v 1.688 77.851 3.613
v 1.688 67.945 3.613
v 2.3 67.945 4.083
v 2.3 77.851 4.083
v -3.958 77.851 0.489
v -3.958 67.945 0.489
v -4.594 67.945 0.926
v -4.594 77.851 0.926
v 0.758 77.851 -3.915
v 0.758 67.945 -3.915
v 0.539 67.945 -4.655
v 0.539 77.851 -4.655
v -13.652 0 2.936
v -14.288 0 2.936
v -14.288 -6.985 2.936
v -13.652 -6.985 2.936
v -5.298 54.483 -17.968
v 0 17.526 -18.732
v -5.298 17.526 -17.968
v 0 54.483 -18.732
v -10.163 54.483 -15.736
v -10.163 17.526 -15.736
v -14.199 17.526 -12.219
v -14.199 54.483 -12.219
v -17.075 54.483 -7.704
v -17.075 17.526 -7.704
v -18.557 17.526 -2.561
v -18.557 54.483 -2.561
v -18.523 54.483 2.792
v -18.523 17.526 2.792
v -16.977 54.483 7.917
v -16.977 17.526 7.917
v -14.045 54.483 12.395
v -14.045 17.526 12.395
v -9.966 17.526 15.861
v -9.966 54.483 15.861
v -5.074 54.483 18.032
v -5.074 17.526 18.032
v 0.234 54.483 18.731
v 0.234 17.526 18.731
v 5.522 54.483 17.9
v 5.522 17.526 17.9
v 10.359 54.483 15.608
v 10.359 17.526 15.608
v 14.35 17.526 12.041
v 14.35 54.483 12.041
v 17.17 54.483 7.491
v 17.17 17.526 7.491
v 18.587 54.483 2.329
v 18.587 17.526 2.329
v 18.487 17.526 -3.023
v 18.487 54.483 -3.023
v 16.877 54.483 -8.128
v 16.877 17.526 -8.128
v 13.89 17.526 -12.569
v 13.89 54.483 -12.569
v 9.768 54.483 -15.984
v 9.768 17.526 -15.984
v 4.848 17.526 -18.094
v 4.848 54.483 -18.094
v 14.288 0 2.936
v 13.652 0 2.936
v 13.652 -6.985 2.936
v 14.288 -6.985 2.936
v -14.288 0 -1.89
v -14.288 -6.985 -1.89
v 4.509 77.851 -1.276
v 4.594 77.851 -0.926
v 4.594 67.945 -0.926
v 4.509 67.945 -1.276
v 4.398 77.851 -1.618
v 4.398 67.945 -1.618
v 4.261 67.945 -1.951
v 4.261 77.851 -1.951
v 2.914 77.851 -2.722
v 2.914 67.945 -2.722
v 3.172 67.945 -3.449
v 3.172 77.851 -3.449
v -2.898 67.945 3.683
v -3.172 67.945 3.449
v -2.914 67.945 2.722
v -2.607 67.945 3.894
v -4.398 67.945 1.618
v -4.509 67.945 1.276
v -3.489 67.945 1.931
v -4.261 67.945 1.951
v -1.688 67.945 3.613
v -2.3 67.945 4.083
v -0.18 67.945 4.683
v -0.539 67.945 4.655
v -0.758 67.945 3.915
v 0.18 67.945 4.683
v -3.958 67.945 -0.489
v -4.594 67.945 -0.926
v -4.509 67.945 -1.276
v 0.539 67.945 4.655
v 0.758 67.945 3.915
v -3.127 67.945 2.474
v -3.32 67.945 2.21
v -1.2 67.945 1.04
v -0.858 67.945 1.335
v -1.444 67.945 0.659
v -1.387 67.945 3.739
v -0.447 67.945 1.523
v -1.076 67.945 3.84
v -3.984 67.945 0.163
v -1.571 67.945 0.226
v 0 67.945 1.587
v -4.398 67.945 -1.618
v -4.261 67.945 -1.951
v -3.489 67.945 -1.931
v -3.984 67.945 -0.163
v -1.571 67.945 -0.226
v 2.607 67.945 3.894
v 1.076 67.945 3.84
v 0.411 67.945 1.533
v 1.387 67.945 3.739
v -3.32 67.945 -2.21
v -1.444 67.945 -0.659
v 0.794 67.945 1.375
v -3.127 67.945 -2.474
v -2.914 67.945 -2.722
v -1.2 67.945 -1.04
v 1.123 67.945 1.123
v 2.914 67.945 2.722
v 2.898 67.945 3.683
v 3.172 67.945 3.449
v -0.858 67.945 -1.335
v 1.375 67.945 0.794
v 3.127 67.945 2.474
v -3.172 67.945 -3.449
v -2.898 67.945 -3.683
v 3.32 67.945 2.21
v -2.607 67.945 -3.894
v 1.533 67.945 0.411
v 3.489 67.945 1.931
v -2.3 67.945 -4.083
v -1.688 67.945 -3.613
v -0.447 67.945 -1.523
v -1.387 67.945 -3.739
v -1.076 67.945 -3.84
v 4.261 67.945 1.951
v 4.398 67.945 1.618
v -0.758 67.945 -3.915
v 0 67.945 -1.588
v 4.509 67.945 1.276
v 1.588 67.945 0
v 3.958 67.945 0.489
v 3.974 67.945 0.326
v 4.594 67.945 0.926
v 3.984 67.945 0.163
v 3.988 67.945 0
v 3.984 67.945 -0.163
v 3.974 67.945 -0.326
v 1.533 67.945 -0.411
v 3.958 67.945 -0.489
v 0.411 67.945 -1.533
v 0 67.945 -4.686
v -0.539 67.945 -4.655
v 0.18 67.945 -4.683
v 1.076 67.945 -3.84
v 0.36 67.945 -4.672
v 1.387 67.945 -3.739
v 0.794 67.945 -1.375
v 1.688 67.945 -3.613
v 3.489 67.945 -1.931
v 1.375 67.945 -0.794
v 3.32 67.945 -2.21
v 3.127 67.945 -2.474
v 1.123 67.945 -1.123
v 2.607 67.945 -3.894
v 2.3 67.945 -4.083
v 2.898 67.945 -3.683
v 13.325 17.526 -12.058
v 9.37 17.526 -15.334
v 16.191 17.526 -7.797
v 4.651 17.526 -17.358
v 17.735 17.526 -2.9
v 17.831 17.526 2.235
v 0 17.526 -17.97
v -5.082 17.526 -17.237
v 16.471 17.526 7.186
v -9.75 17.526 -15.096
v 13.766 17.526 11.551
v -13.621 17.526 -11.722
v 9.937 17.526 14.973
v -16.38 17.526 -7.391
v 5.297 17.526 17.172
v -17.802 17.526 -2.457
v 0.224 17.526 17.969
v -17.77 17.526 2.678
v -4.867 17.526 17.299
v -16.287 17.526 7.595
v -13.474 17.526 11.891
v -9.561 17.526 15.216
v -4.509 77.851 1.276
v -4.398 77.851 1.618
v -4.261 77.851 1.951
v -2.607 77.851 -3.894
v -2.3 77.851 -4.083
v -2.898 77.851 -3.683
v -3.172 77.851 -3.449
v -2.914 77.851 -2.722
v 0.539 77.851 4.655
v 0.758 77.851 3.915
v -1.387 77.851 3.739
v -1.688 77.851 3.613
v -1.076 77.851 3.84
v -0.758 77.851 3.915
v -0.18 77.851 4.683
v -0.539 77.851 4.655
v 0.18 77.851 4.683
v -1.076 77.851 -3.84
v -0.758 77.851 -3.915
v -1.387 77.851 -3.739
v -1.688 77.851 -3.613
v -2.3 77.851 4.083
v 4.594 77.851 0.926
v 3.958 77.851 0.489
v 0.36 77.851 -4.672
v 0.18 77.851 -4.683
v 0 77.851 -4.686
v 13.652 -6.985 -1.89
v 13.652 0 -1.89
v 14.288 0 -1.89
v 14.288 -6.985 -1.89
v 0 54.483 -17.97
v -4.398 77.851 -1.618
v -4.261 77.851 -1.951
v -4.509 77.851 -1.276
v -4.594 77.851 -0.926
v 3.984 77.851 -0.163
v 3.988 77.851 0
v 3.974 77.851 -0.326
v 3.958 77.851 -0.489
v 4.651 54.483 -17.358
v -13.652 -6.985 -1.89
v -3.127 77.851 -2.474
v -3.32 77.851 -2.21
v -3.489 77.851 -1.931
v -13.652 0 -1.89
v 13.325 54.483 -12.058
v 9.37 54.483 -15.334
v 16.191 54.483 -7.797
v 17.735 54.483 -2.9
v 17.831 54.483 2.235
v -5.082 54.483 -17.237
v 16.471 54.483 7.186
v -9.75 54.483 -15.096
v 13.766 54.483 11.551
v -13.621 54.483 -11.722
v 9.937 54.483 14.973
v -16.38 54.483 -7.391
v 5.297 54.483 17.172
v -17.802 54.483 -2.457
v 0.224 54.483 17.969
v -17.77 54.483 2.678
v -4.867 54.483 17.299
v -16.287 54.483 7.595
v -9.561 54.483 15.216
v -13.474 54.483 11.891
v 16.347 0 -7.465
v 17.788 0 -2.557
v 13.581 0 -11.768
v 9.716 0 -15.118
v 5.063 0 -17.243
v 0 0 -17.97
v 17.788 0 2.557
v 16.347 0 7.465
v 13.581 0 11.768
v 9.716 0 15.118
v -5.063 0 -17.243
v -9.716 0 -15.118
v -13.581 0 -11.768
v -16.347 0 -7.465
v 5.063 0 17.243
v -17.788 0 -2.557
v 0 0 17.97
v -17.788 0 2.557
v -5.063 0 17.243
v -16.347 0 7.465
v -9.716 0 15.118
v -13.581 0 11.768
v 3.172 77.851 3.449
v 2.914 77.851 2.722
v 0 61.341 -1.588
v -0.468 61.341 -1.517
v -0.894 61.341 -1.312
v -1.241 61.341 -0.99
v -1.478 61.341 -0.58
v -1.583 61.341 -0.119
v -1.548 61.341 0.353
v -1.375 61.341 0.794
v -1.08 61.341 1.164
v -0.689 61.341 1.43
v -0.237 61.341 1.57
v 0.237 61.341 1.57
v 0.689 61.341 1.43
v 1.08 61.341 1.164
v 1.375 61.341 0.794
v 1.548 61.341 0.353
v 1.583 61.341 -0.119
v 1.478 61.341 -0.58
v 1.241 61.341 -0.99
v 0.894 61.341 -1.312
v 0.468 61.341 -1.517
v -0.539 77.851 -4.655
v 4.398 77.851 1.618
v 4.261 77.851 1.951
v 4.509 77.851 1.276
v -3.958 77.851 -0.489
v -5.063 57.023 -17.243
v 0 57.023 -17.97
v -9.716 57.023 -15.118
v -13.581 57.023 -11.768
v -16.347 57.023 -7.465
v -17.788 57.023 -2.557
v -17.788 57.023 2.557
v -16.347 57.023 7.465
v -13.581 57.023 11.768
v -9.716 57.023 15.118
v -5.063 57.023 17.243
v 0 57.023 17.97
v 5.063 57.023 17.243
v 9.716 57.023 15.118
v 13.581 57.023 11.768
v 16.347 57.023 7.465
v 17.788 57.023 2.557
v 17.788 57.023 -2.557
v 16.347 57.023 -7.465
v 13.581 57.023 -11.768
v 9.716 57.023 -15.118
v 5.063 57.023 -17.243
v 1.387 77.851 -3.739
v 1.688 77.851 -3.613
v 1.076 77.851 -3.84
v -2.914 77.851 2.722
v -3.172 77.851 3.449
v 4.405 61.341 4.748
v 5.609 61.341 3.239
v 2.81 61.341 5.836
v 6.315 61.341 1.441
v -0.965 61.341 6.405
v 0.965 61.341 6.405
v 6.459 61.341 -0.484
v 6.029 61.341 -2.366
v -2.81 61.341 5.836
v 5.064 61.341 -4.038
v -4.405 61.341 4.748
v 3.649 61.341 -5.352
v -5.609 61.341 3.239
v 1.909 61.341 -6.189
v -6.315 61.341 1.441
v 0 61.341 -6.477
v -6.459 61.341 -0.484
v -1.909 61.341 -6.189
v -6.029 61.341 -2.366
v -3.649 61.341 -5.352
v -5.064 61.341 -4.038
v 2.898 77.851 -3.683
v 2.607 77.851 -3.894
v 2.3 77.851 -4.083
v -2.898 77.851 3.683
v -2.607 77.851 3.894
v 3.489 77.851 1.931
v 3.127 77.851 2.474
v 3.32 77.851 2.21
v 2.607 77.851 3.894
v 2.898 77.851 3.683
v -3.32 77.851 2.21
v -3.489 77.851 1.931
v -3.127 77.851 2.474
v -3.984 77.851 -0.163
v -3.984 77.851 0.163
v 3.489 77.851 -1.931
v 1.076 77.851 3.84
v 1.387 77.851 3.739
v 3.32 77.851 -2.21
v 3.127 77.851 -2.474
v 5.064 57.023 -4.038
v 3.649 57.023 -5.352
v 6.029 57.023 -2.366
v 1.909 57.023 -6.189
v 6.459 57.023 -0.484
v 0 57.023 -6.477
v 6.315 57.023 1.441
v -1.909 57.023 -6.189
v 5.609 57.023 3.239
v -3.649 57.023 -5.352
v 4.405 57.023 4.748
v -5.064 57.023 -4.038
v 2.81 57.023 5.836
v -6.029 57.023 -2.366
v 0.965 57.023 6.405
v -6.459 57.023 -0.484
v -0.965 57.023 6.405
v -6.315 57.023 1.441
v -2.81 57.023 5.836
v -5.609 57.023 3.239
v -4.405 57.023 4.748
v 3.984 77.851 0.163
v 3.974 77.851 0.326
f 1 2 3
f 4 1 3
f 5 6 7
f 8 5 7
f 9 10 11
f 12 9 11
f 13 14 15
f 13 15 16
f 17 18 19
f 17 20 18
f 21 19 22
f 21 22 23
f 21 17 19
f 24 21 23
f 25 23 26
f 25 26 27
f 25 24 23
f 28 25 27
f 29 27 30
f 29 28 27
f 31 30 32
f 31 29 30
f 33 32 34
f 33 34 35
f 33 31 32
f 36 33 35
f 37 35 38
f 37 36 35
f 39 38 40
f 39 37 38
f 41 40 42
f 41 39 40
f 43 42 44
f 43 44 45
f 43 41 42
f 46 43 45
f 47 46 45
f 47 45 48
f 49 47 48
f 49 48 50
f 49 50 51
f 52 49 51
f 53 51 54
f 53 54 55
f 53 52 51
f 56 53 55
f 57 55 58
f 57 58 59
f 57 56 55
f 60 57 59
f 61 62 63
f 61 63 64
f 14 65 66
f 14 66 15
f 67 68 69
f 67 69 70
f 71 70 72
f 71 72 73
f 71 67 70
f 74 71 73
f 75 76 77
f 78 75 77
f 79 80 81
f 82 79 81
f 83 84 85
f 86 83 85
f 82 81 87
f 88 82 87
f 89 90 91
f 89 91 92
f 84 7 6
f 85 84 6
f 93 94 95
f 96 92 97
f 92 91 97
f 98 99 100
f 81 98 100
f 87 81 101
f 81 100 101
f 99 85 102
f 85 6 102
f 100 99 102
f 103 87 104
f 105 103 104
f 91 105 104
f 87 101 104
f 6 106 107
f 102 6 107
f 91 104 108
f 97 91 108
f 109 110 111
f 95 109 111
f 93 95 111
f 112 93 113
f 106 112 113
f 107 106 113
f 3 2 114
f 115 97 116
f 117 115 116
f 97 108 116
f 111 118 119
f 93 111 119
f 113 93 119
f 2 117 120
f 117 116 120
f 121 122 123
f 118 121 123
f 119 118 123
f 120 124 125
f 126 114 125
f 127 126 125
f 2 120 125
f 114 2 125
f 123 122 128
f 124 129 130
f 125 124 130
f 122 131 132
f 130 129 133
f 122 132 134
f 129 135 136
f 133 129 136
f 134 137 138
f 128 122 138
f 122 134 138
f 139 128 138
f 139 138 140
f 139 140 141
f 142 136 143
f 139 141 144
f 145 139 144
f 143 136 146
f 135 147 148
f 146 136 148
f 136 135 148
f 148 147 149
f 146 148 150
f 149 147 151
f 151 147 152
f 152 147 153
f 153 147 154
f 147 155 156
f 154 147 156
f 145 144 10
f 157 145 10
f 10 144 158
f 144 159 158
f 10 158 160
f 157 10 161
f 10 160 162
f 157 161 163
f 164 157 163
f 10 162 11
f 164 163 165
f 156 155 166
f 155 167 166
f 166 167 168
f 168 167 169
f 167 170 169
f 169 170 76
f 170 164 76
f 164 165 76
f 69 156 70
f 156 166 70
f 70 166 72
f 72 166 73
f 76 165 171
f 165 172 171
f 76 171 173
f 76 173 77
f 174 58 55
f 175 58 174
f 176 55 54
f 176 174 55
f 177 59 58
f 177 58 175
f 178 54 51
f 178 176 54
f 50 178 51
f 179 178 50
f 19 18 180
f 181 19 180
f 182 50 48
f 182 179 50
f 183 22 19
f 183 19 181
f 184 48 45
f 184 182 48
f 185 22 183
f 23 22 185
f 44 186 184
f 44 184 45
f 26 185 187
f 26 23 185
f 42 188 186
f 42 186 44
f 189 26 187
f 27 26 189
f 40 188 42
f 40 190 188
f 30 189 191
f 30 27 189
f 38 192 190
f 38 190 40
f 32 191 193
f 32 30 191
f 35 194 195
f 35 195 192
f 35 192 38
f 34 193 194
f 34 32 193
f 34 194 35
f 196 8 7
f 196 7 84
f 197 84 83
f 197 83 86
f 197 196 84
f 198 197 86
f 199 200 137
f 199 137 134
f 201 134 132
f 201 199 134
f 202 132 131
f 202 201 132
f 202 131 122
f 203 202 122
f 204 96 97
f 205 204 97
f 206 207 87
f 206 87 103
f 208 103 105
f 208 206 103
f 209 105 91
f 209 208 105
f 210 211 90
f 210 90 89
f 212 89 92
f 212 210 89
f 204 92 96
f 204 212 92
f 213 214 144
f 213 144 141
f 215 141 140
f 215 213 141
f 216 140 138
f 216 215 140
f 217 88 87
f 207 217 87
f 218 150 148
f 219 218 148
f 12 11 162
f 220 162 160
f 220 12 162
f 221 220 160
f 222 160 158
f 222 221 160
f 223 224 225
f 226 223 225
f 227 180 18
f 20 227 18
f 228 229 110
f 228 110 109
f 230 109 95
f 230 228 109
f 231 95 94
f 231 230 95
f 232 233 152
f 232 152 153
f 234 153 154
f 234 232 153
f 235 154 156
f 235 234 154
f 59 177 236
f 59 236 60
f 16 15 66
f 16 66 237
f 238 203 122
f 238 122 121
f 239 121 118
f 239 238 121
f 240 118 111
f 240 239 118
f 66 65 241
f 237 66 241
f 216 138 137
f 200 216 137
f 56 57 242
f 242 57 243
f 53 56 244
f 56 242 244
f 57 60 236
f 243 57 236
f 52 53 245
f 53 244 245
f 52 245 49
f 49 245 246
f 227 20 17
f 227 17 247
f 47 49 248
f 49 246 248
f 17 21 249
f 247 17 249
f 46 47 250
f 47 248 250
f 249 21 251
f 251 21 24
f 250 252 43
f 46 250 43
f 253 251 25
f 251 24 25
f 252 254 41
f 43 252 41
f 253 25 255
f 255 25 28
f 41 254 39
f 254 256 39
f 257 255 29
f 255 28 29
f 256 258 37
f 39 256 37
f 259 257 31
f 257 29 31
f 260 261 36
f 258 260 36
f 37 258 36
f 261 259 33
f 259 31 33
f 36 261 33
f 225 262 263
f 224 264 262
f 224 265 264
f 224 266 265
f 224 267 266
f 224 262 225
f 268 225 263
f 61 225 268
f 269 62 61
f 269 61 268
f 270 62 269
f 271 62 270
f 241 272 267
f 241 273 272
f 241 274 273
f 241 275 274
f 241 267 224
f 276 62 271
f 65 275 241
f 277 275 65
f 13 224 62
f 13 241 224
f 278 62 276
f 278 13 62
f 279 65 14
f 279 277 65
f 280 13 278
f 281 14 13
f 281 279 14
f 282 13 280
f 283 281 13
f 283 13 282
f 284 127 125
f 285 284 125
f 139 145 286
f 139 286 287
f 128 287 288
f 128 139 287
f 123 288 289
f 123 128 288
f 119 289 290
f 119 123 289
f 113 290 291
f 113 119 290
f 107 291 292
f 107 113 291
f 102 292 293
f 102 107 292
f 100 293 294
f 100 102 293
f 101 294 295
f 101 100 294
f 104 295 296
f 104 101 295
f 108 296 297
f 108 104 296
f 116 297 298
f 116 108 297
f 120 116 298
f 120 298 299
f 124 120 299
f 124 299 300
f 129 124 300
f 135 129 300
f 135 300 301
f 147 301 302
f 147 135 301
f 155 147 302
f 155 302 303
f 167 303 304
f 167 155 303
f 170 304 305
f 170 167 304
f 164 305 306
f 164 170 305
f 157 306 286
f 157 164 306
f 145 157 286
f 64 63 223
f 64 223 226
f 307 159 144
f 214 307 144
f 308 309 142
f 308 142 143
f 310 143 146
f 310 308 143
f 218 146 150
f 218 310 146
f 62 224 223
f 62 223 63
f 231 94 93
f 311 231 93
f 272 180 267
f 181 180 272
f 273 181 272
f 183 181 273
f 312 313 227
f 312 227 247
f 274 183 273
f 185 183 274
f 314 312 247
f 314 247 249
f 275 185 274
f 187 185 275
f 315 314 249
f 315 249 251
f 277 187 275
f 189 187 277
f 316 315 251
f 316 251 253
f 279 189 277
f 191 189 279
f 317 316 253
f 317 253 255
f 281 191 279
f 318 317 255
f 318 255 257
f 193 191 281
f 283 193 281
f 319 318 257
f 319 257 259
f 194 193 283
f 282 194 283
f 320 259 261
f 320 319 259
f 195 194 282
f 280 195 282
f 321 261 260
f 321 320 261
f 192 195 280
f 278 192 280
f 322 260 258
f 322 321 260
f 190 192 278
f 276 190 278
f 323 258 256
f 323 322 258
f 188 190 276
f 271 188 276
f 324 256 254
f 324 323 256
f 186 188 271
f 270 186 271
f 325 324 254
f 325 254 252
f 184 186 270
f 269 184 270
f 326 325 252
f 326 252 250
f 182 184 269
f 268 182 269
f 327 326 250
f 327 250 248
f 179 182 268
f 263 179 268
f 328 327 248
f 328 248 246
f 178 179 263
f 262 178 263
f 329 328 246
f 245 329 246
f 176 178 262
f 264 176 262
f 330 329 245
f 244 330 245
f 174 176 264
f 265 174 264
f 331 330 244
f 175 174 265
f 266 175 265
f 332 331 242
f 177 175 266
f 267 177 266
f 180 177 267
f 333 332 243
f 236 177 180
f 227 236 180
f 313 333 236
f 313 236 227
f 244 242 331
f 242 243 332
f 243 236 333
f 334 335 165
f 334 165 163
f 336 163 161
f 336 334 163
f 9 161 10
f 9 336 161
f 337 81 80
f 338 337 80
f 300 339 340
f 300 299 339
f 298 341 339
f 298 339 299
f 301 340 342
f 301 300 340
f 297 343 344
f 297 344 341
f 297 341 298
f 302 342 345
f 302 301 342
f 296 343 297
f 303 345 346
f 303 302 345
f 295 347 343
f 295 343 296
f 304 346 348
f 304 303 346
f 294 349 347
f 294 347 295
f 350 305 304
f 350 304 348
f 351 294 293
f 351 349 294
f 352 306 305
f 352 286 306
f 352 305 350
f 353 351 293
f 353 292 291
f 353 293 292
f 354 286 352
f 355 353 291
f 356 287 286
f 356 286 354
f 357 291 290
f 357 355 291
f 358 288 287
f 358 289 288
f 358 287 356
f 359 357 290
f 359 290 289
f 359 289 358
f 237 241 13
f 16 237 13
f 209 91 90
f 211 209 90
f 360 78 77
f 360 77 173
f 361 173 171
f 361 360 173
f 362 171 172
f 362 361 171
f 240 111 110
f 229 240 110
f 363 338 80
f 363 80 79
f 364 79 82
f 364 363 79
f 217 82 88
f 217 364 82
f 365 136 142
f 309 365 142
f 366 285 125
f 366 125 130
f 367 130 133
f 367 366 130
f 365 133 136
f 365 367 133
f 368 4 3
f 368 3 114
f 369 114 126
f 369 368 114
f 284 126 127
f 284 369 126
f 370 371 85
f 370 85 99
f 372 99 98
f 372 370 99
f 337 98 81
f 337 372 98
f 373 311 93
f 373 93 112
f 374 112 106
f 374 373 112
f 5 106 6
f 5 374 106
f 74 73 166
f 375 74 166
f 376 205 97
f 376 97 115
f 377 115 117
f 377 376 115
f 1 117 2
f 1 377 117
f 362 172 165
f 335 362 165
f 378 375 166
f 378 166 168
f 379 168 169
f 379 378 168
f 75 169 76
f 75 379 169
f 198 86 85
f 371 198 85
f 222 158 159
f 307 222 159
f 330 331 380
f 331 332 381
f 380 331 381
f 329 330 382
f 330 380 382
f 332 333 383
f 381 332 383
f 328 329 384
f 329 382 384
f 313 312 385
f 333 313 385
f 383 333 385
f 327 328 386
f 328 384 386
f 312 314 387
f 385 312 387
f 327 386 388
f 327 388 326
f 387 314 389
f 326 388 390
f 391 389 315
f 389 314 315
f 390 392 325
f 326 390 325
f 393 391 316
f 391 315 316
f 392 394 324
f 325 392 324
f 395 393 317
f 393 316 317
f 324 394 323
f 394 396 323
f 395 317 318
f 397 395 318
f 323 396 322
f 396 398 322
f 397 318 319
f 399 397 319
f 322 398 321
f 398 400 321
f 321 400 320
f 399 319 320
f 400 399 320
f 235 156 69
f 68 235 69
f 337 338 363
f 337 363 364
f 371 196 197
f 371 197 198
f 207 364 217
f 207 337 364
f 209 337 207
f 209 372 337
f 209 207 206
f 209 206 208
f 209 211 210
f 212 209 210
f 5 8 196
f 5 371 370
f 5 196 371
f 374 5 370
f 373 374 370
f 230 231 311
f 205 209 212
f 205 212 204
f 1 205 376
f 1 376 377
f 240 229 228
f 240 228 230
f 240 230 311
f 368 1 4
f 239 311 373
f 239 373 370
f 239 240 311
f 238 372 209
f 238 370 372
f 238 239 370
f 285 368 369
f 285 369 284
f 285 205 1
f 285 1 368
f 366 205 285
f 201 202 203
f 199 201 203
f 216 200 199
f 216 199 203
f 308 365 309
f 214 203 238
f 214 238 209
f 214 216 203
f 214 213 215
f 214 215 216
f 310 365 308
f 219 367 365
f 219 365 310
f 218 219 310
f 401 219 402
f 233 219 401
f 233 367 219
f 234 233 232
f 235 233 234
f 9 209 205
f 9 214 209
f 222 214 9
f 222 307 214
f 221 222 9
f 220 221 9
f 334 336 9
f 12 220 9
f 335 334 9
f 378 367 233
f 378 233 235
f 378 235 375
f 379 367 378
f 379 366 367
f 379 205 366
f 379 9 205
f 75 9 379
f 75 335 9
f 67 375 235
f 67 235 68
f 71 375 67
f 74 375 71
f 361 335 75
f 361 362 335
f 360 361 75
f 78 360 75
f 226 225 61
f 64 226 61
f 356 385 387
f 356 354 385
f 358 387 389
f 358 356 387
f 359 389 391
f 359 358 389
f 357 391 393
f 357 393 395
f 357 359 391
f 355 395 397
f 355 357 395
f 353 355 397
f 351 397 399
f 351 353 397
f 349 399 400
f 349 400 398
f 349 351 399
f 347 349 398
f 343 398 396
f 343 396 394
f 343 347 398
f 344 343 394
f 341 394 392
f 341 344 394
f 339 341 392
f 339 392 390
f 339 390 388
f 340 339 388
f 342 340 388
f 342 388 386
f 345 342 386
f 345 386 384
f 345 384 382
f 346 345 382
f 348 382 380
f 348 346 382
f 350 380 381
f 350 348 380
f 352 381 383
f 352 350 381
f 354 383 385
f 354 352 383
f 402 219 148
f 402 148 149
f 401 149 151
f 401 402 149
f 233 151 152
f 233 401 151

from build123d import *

# Parameters (mm, degrees)
SKETCH4_W           = 17.9705
SKETCH4_H           = 57.023
SKETCH4_W_2         = 1.5875
SKETCH4_H_2         = 16.51
BOSS_EXTRUDE3_DEPTH = 9.906
SKETCH6_W           = 0.762
SKETCH6_H           = 36.957
REVOLVE2_ANGLE      = 345
SKETCH8_W           = 0.635
SKETCH8_H           = 4.826
BOSS_EXTRUDE4_DEPTH = 6.985


with BuildPart() as part:
    # Sketch4 → Revolve1 (revolve)
    with BuildSketch(Plane(origin=(0, 0, 0), x_dir=(0, 0, -1), z_dir=(1, 0, 0))):
        with Locations((8.98525, 28.5115)):
            Rectangle(SKETCH4_W, SKETCH4_H)
        Polygon((0, 61.341), (0, 57.023), (6.477, 57.023), (6.477, 61.341), (1.5875, 61.341), align=None)
        with Locations((0.79375, 69.596)):
            Rectangle(SKETCH4_W_2, SKETCH4_H_2)
    revolve(axis=Axis((0, -9.179219972, 0), (0, 1, 0)))

    # Sketch5 → Boss-Extrude3 (add)
    # profile 1 of 12: a face of its own
    with BuildSketch(Plane(origin=(0, 77.851, 0), x_dir=(1, 0, 0), z_dir=(0, 1, 0))):
        with BuildLine():
            ThreePointArc((-2.91443478, 2.721877799), (-2.343970029, 3.22619797), (-1.688049741, 3.612898686))
            Line((-1.688049741, 3.612898686), (-2.300310076, 4.082888836))
            ThreePointArc((-2.300310076, 4.082888836), (-2.754538028, 3.791296341), (-3.172223127, 3.449406923))
            Line((-3.172223127, 3.449406923), (-2.91443478, 2.721877799))
        make_face()
    # profile 2 of 12: a face of its own
    with BuildSketch(Plane(origin=(0, 77.851, 0), x_dir=(1, 0, 0), z_dir=(0, 1, 0))):
        with BuildLine():
            Line((0, 4.6863), (0, 3.9878))
            ThreePointArc((0, 3.9878), (0.380712775, 3.969585195), (0.757947638, 3.915107178))
            Line((0.757947638, 3.915107178), (0.538871901, 4.655214793))
            ThreePointArc((0.538871901, 4.655214793), (0.269883871, 4.678522244), (0, 4.6863))
        make_face()
    # profile 3 of 12: a face of its own
    with BuildSketch(Plane(origin=(0, 77.851, 0), x_dir=(1, 0, 0), z_dir=(0, 1, 0))):
        with BuildLine():
            Line((-0.538871901, 4.655214793), (-0.757947638, 3.915107178))
            ThreePointArc((-0.757947638, 3.915107178), (-0.380712775, 3.969585195), (0, 3.9878))
            Line((0, 3.9878), (0, 4.6863))
            Line((0, 4.6863), (-0.538871901, 4.655214793))
        make_face()
    # profile 4 of 12: a face of its own
    with BuildSketch(Plane(origin=(0, 77.851, 0), x_dir=(1, 0, 0), z_dir=(0, 1, 0))):
        with BuildLine():
            Line((2.300310076, 4.082888836), (1.688049741, 3.612898686))
            ThreePointArc((1.688049741, 3.612898686), (2.343970029, 3.22619797), (2.91443478, 2.721877799))
            Line((2.91443478, 2.721877799), (3.172223127, 3.449406923))
            ThreePointArc((3.172223127, 3.449406923), (2.754538028, 3.791296341), (2.300310076, 4.082888836))
        make_face()
    # profile 5 of 12: a face of its own
    with BuildSketch(Plane(origin=(0, 77.851, 0), x_dir=(1, 0, 0), z_dir=(0, 1, 0))):
        with BuildLine():
            Line((4.260851788, 1.951038116), (3.489269493, 1.930685693))
            ThreePointArc((3.489269493, 1.930685693), (3.792623176, 1.23229797), (3.957706895, 0.488983613))
            Line((3.957706895, 0.488983613), (4.593892938, 0.926042851))
            ThreePointArc((4.593892938, 0.926042851), (4.456936152, 1.448146341), (4.260851788, 1.951038116))
        make_face()
    # profile 6 of 12: a face of its own
    with BuildSketch(Plane(origin=(0, 77.851, 0), x_dir=(1, 0, 0), z_dir=(0, 1, 0))):
        with BuildLine():
            Line((4.593892938, -0.926042851), (3.957706895, -0.488983613))
            ThreePointArc((3.957706895, -0.488983613), (3.792623176, -1.23229797), (3.489269493, -1.930685693))
            Line((3.489269493, -1.930685693), (4.260851788, -1.951038116))
            ThreePointArc((4.260851788, -1.951038116), (4.456936152, -1.448146341), (4.593892938, -0.926042851))
        make_face()
    # profile 7 of 12: a face of its own
    with BuildSketch(Plane(origin=(0, 77.851, 0), x_dir=(1, 0, 0), z_dir=(0, 1, 0))):
        with BuildLine():
            Line((3.172223127, -3.449406923), (2.91443478, -2.721877799))
            ThreePointArc((2.91443478, -2.721877799), (2.343970029, -3.22619797), (1.688049741, -3.612898686))
            Line((1.688049741, -3.612898686), (2.300310076, -4.082888836))
            ThreePointArc((2.300310076, -4.082888836), (2.754538028, -3.791296341), (3.172223127, -3.449406923))
        make_face()
    # profile 8 of 12: a face of its own
    with BuildSketch(Plane(origin=(0, 77.851, 0), x_dir=(1, 0, 0), z_dir=(0, 1, 0))):
        with BuildLine():
            ThreePointArc((0.757947638, -3.915107178), (0, -3.9878), (-0.757947638, -3.915107178))
            Line((-0.757947638, -3.915107178), (-0.538871901, -4.655214793))
            ThreePointArc((-0.538871901, -4.655214793), (0, -4.6863), (0.538871901, -4.655214793))
            Line((0.538871901, -4.655214793), (0.757947638, -3.915107178))
        make_face()
    # profile 9 of 12: a face of its own
    with BuildSketch(Plane(origin=(0, 77.851, 0), x_dir=(1, 0, 0), z_dir=(0, 1, 0))):
        with BuildLine():
            ThreePointArc((-1.688049741, -3.612898686), (-2.343970029, -3.22619797), (-2.91443478, -2.721877799))
            Line((-2.91443478, -2.721877799), (-3.172223127, -3.449406923))
            ThreePointArc((-3.172223127, -3.449406923), (-2.754538028, -3.791296341), (-2.300310076, -4.082888836))
            Line((-2.300310076, -4.082888836), (-1.688049741, -3.612898686))
        make_face()
    # profile 10 of 12: a face of its own
    with BuildSketch(Plane(origin=(0, 77.851, 0), x_dir=(1, 0, 0), z_dir=(0, 1, 0))):
        with BuildLine():
            ThreePointArc((-3.489269493, -1.930685693), (-3.792623176, -1.23229797), (-3.957706895, -0.488983613))
            Line((-3.957706895, -0.488983613), (-4.593892938, -0.926042851))
            ThreePointArc((-4.593892938, -0.926042851), (-4.456936152, -1.448146341), (-4.260851788, -1.951038116))
            Line((-4.260851788, -1.951038116), (-3.489269493, -1.930685693))
        make_face()
    # profile 11 of 12: a face of its own
    with BuildSketch(Plane(origin=(0, 77.851, 0), x_dir=(1, 0, 0), z_dir=(0, 1, 0))):
        with BuildLine():
            ThreePointArc((-3.957706895, 0.488983613), (-3.792623176, 1.23229797), (-3.489269493, 1.930685693))
            Line((-3.489269493, 1.930685693), (-4.260851788, 1.951038116))
            ThreePointArc((-4.260851788, 1.951038116), (-4.456936152, 1.448146341), (-4.593892938, 0.926042851))
            Line((-4.593892938, 0.926042851), (-3.957706895, 0.488983613))
        make_face()
    # profile 12 of 12: a face of its own
    with BuildSketch(Plane(origin=(0, 77.851, 0), x_dir=(1, 0, 0), z_dir=(0, 1, 0))):
        with BuildLine():
            ThreePointArc((0, 3.9878), (-0.380712775, 3.969585195), (-0.757947638, 3.915107178))
            ThreePointArc((-0.757947638, 3.915107178), (-1.23229797, 3.792623176), (-1.688049741, 3.612898686))
            ThreePointArc((-1.688049741, 3.612898686), (-2.343970029, 3.22619797), (-2.91443478, 2.721877799))
            ThreePointArc((-2.91443478, 2.721877799), (-3.22619797, 2.343970029), (-3.489269493, 1.930685693))
            ThreePointArc((-3.489269493, 1.930685693), (-3.792623176, 1.23229797), (-3.957706895, 0.488983613))
            ThreePointArc((-3.957706895, 0.488983613), (-3.9878, 0), (-3.957706895, -0.488983613))
            ThreePointArc((-3.957706895, -0.488983613), (-3.792623176, -1.23229797), (-3.489269493, -1.930685693))
            ThreePointArc((-3.489269493, -1.930685693), (-3.22619797, -2.343970029), (-2.91443478, -2.721877799))
            ThreePointArc((-2.91443478, -2.721877799), (-2.343970029, -3.22619797), (-1.688049741, -3.612898686))
            ThreePointArc((-1.688049741, -3.612898686), (-1.23229797, -3.792623176), (-0.757947638, -3.915107178))
            ThreePointArc((-0.757947638, -3.915107178), (0, -3.9878), (0.757947638, -3.915107178))
            ThreePointArc((0.757947638, -3.915107178), (1.23229797, -3.792623176), (1.688049741, -3.612898686))
            ThreePointArc((1.688049741, -3.612898686), (2.343970029, -3.22619797), (2.91443478, -2.721877799))
            ThreePointArc((2.91443478, -2.721877799), (3.22619797, -2.343970029), (3.489269493, -1.930685693))
            ThreePointArc((3.489269493, -1.930685693), (3.792623176, -1.23229797), (3.957706895, -0.488983613))
            ThreePointArc((3.957706895, -0.488983613), (3.980269614, -0.244954368), (3.9878, 0))
            ThreePointArc((3.9878, 0), (3.980269614, 0.244954368), (3.957706895, 0.488983613))
            ThreePointArc((3.957706895, 0.488983613), (3.792623176, 1.23229797), (3.489269493, 1.930685693))
            ThreePointArc((3.489269493, 1.930685693), (3.22619797, 2.343970029), (2.91443478, 2.721877799))
            ThreePointArc((2.91443478, 2.721877799), (2.343970029, 3.22619797), (1.688049741, 3.612898686))
            ThreePointArc((1.688049741, 3.612898686), (1.23229797, 3.792623176), (0.757947638, 3.915107178))
            ThreePointArc((0.757947638, 3.915107178), (0.380712775, 3.969585195), (0, 3.9878))
        make_face()
        with BuildLine():
            ThreePointArc((0, -1.5875), (-1.5875, 0), (0, 1.5875))
            ThreePointArc((0, 1.5875), (1.122532015, 1.122532015), (1.5875, 0))
            ThreePointArc((1.5875, 0), (1.122532015, -1.122532015), (0, -1.5875))
        make_face(mode=Mode.SUBTRACT)
    extrude(amount=-BOSS_EXTRUDE3_DEPTH)

    # Sketch6 → Revolve2 (revolve)
    with BuildSketch(Plane(origin=(0, 0, 0), x_dir=(0, 0, -1), z_dir=(1, 0, 0))):
        with Locations((18.3515, 36.0045)):
            Rectangle(SKETCH6_W, SKETCH6_H)
    revolve(axis=Axis((0, 0, 0), (0, 1, 0)), revolution_arc=REVOLVE2_ANGLE)

    # Sketch8 → Boss-Extrude4 (add)
    with BuildSketch(Plane.XZ):
        with Locations((-13.97, 0.523045405)):
            Rectangle(SKETCH8_W, SKETCH8_H)
        with Locations((13.97, 0.523045405)):
            Rectangle(SKETCH8_W, SKETCH8_H)
    extrude(amount=BOSS_EXTRUDE4_DEPTH)


solid = part.part
